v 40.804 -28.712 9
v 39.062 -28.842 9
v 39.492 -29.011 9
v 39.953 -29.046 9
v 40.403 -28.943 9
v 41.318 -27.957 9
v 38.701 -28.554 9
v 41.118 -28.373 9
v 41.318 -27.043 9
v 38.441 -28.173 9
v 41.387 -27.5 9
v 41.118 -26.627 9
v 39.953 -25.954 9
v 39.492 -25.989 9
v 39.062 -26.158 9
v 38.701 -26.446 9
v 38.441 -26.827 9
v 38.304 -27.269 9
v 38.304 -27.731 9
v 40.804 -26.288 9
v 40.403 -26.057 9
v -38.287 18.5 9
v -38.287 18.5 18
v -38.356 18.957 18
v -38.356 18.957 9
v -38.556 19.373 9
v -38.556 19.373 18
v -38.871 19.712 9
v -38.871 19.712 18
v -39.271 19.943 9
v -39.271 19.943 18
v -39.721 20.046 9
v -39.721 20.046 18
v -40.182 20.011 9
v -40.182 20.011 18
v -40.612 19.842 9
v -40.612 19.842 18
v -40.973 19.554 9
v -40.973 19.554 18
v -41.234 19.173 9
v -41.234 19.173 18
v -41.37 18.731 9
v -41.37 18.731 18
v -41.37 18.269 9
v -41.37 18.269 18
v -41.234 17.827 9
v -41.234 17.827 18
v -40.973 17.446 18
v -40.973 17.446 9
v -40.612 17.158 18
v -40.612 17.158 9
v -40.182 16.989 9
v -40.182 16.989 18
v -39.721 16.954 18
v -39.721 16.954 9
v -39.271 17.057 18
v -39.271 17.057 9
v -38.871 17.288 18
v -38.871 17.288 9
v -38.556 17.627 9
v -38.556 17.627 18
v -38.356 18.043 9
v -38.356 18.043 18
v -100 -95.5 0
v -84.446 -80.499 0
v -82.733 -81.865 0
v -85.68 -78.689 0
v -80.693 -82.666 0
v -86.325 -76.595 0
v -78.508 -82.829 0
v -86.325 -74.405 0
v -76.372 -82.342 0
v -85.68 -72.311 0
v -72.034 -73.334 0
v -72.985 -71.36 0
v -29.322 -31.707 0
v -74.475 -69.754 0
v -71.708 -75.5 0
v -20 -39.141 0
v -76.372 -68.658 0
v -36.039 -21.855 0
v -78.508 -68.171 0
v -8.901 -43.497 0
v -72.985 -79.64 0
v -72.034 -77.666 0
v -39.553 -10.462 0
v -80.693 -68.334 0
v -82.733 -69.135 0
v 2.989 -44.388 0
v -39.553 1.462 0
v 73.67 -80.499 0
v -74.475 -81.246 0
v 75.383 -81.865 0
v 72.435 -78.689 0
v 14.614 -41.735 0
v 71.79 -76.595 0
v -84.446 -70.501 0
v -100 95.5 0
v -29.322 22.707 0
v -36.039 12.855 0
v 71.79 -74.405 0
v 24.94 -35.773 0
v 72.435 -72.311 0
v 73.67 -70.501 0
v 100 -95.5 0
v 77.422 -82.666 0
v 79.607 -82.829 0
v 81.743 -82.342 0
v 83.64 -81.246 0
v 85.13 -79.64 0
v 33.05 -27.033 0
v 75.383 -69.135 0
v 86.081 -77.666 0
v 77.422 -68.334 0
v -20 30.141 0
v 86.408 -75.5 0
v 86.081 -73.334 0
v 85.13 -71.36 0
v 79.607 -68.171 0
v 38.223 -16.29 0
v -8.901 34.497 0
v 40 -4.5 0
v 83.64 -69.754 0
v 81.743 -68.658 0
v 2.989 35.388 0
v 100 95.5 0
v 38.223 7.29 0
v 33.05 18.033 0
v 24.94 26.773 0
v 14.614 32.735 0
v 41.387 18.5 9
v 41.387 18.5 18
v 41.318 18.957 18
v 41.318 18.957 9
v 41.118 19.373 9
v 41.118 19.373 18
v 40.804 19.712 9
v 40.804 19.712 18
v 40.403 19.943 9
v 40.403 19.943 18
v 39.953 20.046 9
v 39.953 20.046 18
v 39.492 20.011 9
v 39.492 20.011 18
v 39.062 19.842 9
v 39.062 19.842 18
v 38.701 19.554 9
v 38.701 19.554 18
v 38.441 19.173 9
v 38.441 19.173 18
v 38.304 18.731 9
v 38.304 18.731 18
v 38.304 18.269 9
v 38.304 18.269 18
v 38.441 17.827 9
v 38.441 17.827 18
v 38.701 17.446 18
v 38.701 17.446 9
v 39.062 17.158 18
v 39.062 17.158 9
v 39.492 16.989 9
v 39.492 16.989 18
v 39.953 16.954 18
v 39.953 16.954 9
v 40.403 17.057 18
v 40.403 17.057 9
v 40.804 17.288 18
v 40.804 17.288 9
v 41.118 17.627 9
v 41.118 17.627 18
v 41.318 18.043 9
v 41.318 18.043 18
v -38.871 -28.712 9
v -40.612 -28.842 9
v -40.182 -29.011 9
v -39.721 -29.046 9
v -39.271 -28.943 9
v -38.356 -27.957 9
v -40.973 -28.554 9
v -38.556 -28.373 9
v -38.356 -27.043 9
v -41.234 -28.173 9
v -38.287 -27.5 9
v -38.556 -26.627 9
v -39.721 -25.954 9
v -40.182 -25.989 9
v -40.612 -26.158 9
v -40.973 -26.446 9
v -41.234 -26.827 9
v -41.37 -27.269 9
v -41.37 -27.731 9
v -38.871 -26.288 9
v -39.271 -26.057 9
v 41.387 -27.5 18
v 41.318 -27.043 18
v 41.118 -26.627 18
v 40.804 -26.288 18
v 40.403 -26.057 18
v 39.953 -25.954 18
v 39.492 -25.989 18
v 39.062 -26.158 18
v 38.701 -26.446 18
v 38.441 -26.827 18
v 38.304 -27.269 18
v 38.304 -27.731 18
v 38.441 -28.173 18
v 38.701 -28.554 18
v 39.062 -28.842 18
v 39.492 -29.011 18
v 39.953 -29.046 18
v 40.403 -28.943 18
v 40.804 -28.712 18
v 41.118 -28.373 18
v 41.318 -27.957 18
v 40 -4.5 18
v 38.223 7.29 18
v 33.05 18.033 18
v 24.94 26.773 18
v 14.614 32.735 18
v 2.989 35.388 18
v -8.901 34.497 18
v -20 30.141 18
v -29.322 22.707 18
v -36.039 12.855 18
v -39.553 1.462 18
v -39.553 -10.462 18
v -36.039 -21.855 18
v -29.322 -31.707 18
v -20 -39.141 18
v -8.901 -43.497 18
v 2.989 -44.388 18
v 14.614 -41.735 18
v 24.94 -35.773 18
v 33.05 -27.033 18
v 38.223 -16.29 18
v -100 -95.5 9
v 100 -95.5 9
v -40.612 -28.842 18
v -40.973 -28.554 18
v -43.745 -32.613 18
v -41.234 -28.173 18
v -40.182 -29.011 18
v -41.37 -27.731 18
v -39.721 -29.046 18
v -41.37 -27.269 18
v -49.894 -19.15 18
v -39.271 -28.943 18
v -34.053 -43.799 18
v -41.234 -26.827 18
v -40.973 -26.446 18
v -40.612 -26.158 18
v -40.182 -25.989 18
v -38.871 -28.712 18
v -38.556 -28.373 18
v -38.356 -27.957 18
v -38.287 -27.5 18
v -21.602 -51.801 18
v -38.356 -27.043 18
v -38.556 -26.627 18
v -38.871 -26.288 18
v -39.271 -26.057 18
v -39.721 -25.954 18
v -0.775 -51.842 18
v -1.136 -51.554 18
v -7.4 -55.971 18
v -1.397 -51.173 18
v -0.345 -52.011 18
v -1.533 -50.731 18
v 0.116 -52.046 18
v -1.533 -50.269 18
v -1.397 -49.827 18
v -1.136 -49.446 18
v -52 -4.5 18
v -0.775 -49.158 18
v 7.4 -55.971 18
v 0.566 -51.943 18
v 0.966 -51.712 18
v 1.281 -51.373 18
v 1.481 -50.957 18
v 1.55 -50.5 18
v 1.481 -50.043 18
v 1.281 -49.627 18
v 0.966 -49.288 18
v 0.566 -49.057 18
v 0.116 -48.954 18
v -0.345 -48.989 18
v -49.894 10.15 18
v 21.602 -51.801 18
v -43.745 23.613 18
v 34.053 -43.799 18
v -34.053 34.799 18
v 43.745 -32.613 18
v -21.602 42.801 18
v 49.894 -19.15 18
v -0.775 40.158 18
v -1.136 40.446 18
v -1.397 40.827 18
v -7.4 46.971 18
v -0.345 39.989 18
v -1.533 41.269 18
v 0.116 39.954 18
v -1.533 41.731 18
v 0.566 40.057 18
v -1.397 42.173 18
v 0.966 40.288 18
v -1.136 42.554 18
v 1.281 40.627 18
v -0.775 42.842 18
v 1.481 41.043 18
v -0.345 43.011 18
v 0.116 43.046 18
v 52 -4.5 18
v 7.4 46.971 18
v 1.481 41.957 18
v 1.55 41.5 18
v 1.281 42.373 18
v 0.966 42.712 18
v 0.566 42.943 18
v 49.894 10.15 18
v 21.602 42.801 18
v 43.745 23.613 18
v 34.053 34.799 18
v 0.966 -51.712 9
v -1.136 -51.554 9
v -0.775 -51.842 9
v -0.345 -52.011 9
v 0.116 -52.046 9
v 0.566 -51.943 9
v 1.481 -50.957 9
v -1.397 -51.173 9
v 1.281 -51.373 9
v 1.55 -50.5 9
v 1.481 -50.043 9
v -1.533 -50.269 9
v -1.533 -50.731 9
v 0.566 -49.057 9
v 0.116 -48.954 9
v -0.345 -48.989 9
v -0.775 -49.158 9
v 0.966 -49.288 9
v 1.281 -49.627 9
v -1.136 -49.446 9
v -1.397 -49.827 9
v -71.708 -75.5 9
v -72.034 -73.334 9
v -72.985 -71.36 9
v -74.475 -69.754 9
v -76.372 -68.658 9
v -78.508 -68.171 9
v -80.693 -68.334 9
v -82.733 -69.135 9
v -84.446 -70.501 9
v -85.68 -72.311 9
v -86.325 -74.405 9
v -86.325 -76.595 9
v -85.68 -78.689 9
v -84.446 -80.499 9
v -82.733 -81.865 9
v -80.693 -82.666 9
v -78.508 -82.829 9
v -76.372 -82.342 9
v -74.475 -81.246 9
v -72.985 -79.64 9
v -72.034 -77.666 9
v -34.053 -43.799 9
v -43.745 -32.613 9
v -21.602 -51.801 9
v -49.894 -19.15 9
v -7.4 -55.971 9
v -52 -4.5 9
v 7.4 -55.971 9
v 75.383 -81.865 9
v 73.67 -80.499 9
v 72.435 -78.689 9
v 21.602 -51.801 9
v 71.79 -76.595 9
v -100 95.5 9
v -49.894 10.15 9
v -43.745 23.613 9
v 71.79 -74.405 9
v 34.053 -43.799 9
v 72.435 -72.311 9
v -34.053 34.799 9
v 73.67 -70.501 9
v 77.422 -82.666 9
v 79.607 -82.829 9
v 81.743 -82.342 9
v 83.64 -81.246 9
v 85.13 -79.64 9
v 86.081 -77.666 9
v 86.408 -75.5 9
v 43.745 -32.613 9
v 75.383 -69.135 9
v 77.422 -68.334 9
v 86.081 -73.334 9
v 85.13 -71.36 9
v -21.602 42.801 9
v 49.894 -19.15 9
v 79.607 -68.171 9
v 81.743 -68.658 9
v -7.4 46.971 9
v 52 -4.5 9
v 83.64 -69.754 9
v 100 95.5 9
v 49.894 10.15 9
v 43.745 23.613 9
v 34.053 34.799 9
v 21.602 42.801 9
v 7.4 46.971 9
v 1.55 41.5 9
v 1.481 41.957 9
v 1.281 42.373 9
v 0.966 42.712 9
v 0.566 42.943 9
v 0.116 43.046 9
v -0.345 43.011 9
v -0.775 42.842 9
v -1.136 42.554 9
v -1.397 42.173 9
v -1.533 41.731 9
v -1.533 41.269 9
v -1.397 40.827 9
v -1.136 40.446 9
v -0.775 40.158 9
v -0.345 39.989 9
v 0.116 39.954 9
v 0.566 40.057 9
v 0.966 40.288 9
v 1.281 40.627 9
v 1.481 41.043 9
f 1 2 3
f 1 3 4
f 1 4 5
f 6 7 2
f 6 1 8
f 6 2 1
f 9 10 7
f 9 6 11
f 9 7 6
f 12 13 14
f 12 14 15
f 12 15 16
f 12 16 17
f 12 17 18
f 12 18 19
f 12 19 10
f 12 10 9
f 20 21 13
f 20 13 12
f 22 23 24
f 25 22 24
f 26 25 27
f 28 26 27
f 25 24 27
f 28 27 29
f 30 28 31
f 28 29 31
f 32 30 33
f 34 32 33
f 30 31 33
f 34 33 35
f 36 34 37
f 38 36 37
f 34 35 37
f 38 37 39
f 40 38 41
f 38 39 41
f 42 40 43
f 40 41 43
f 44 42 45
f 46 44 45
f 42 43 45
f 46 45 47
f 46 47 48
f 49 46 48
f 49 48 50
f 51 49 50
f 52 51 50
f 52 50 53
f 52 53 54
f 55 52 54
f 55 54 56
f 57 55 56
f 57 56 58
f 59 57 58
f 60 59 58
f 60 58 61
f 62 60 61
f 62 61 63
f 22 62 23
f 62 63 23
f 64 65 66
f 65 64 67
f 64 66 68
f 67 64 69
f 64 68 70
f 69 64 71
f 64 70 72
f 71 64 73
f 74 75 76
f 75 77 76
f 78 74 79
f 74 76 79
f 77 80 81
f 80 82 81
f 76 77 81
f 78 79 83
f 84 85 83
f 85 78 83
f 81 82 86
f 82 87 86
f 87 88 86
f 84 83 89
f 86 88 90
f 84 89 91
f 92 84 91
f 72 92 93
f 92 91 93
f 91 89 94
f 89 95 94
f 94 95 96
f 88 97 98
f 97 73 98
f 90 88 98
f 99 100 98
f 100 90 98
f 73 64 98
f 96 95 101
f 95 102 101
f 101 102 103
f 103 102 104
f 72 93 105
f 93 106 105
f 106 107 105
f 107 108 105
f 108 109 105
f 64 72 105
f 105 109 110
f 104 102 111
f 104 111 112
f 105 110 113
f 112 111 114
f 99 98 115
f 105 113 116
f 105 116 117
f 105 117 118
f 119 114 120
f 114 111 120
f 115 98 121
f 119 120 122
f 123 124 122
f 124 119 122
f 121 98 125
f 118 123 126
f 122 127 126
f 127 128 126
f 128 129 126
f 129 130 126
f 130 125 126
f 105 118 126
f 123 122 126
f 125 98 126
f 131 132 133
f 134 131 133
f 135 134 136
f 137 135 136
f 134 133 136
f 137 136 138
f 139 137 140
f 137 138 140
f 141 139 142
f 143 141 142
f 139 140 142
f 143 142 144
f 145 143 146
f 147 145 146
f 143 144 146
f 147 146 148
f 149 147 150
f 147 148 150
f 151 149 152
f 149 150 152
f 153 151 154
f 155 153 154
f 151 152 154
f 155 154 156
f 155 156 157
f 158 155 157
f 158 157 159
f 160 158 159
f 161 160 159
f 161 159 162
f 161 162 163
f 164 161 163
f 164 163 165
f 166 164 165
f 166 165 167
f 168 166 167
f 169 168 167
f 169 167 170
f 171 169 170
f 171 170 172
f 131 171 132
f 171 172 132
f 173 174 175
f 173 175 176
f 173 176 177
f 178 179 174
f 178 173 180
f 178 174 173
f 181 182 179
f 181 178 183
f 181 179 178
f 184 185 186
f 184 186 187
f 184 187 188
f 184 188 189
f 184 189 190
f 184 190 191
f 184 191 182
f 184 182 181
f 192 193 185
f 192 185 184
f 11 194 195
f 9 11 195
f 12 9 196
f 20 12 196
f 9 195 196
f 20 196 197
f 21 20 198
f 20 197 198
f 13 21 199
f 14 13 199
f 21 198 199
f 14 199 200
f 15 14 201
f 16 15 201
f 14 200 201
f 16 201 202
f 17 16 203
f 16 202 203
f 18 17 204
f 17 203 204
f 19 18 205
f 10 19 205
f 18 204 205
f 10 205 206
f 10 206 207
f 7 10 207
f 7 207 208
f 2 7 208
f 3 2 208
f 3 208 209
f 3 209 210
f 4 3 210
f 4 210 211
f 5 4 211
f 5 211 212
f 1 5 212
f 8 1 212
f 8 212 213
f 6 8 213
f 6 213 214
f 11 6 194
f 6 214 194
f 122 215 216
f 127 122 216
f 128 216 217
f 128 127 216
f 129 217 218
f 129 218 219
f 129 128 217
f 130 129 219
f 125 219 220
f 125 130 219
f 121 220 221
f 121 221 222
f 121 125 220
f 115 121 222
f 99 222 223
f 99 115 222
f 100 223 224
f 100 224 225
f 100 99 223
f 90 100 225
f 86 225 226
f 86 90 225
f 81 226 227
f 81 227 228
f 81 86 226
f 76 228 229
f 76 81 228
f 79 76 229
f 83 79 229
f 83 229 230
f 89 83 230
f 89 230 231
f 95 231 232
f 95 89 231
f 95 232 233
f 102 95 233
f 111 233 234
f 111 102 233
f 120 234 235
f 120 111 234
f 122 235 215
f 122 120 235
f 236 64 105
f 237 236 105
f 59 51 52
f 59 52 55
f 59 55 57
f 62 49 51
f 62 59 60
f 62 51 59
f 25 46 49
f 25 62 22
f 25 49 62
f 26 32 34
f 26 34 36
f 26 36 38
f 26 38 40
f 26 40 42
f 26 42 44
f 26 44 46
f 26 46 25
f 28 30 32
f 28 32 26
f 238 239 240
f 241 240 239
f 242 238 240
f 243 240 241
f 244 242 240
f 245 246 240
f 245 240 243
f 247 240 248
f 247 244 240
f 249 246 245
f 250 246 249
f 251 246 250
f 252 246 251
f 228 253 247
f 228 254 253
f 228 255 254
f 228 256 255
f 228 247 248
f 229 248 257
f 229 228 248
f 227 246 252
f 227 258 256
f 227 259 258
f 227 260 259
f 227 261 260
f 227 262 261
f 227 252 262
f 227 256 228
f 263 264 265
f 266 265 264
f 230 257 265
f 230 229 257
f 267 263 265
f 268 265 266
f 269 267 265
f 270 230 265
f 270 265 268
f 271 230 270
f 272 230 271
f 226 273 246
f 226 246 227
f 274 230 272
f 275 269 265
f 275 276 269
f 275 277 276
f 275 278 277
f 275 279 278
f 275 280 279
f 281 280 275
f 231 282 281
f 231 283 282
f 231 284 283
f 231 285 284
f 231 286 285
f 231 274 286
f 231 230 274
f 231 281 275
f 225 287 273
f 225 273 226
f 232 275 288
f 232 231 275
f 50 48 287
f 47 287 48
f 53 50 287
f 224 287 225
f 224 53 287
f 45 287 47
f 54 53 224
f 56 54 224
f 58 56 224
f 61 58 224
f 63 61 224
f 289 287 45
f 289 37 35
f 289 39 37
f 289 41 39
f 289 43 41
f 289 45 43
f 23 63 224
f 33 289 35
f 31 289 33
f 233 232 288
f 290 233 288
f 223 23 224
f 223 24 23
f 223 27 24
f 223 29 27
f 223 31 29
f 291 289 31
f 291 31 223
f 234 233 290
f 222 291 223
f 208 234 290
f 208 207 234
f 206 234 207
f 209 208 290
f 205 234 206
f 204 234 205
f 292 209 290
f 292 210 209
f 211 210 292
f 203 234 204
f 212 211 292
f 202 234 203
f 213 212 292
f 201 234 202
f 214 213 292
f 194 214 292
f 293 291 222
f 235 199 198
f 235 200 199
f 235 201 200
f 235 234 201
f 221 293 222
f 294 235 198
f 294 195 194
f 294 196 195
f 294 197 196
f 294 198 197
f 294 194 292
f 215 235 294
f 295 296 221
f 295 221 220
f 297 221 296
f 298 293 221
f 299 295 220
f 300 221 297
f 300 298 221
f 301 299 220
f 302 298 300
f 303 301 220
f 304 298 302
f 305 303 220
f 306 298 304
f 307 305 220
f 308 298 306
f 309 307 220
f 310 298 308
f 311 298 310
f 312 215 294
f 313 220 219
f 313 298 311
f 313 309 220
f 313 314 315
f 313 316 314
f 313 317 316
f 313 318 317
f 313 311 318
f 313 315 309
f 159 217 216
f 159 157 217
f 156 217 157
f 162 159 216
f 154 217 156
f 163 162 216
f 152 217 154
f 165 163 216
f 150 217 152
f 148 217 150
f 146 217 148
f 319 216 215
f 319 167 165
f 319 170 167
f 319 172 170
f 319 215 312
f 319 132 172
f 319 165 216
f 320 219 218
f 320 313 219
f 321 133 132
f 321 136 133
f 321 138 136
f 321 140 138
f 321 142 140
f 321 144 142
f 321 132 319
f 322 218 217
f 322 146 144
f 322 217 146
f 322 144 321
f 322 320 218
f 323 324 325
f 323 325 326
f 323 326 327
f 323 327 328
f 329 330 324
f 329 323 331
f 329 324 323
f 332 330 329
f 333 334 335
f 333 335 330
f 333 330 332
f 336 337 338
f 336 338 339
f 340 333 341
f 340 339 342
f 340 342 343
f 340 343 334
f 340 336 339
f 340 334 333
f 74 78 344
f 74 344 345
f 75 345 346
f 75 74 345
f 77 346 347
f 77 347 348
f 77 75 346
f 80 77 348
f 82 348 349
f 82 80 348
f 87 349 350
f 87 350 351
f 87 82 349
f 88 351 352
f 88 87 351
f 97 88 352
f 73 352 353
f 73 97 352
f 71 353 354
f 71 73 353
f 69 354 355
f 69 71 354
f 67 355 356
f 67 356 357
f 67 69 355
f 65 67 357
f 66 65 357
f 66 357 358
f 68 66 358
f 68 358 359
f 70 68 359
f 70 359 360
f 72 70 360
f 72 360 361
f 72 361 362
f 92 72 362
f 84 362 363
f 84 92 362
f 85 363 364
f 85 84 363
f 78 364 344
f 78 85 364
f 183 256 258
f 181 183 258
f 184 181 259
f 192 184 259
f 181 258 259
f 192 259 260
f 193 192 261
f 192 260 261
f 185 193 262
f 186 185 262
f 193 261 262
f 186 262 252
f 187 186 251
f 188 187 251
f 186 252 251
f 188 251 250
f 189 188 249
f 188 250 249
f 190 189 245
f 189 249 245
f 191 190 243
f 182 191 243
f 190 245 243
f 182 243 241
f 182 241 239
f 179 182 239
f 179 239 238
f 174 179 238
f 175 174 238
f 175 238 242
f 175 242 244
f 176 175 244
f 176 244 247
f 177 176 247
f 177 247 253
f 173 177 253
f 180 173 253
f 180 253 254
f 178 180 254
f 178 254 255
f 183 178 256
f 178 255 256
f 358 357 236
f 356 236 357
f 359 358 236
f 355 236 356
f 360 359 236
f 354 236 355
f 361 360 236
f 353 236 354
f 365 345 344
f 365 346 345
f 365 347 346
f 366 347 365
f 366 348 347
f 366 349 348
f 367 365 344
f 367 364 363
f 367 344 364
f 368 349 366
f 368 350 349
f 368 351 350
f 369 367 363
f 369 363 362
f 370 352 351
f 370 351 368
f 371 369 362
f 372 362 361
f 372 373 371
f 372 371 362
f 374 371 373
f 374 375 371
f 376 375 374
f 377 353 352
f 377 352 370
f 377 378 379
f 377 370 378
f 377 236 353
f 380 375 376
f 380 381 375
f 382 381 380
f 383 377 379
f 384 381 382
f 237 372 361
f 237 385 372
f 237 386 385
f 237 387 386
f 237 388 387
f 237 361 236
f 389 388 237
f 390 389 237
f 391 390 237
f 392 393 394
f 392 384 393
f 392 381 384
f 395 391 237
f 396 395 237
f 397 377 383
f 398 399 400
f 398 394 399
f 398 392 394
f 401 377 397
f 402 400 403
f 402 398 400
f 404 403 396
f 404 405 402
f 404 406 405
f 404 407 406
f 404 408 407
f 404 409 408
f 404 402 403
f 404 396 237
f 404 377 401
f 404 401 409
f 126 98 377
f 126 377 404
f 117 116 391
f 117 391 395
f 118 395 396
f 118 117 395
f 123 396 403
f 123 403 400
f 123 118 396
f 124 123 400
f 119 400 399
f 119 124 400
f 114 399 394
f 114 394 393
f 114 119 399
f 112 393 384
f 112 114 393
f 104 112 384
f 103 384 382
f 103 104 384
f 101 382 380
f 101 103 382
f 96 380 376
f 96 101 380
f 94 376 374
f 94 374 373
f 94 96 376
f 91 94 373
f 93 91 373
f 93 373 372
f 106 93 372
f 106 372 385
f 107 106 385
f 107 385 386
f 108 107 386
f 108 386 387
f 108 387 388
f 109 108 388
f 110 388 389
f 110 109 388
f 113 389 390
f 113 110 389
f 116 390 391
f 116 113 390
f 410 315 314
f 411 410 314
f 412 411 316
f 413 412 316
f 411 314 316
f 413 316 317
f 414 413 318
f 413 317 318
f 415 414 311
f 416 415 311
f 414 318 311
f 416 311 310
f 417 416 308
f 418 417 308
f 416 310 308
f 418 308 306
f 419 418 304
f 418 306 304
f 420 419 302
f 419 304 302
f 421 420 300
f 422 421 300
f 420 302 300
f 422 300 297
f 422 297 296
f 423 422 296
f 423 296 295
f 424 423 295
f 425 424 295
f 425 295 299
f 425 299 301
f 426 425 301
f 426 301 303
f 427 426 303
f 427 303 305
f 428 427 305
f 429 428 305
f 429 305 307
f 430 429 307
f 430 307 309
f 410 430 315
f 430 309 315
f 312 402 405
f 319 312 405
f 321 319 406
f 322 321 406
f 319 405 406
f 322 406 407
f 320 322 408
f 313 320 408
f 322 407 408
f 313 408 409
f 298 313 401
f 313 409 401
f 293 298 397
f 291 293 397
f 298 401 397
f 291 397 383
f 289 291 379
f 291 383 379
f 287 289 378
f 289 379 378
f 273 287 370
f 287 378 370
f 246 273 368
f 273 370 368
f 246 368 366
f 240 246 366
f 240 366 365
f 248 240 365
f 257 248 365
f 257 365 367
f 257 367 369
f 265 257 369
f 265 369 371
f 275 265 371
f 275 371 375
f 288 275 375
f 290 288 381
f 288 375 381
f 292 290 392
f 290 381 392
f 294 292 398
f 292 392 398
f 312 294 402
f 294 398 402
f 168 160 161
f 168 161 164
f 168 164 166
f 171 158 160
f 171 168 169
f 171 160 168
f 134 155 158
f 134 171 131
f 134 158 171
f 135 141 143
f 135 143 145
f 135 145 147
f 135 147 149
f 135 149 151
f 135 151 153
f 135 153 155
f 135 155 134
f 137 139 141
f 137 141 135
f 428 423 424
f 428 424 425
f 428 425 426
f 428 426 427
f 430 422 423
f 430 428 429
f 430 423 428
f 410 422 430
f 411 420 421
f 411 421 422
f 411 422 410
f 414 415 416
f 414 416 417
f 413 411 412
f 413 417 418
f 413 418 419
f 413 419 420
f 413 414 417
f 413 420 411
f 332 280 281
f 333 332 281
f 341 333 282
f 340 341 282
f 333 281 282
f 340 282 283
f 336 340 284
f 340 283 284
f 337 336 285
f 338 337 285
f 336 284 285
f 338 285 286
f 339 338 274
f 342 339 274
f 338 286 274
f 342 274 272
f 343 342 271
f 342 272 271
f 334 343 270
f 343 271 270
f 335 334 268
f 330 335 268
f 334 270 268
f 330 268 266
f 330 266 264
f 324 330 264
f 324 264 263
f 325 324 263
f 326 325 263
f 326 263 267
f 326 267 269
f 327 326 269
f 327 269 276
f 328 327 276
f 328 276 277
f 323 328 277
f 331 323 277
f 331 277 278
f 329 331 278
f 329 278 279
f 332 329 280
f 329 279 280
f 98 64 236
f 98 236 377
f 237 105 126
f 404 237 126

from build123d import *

# Parameters (mm, degrees)
SKETCH_1_W          = 200
SKETCH_1_H          = 191
SKETCH_1_R          = 40
SKETCH_1_R_2        = 7.35
EXTRUDE_1_DEPTH     = 9
SKETCH_2_R          = 52
SKETCH_2_R_2        = 40
EXTRUDE_2_DEPTH     = 9
SKETCH_3_R          = 1.55
CUT_EXTRUDE_1_DEPTH = 9


with BuildPart() as part:
    # 草图1 → 凸台-拉伸1 (new body)
    with BuildSketch(Plane.XY):
        Rectangle(SKETCH_1_W, SKETCH_1_H)
        with Locations((0, -4.5)):
            Circle(SKETCH_1_R, mode=Mode.SUBTRACT)
        with Locations((-79.057591623, -75.5)):
            Circle(SKETCH_1_R_2, mode=Mode.SUBTRACT)
        with Locations((79.057591623, -75.5)):
            Circle(SKETCH_1_R_2, mode=Mode.SUBTRACT)
    extrude(amount=EXTRUDE_1_DEPTH)

    # 草图2 → 凸台-拉伸2 (add)
    with BuildSketch(Plane.XY.offset(9)):
        with Locations((0, -4.5)):
            Circle(SKETCH_2_R)
        with Locations((0, -4.5)):
            Circle(SKETCH_2_R_2, mode=Mode.SUBTRACT)
    extrude(amount=EXTRUDE_2_DEPTH)

    # 草图3 → 切除-拉伸1 (cut)
    with BuildSketch(Plane.XY.offset(18)):
        with Locations((1e-09, 41.5)):
            Circle(SKETCH_3_R)
        with Locations((39.837168574, 18.5)):
            Circle(SKETCH_3_R)
        with Locations((39.837168574, -27.5)):
            Circle(SKETCH_3_R)
        with Locations((0, -50.5)):
            Circle(SKETCH_3_R)
        with Locations((-39.837168574, -27.5)):
            Circle(SKETCH_3_R)
        with Locations((-39.837168574, 18.5)):
            Circle(SKETCH_3_R)
    extrude(amount=-CUT_EXTRUDE_1_DEPTH, mode=Mode.SUBTRACT)


solid = part.part
